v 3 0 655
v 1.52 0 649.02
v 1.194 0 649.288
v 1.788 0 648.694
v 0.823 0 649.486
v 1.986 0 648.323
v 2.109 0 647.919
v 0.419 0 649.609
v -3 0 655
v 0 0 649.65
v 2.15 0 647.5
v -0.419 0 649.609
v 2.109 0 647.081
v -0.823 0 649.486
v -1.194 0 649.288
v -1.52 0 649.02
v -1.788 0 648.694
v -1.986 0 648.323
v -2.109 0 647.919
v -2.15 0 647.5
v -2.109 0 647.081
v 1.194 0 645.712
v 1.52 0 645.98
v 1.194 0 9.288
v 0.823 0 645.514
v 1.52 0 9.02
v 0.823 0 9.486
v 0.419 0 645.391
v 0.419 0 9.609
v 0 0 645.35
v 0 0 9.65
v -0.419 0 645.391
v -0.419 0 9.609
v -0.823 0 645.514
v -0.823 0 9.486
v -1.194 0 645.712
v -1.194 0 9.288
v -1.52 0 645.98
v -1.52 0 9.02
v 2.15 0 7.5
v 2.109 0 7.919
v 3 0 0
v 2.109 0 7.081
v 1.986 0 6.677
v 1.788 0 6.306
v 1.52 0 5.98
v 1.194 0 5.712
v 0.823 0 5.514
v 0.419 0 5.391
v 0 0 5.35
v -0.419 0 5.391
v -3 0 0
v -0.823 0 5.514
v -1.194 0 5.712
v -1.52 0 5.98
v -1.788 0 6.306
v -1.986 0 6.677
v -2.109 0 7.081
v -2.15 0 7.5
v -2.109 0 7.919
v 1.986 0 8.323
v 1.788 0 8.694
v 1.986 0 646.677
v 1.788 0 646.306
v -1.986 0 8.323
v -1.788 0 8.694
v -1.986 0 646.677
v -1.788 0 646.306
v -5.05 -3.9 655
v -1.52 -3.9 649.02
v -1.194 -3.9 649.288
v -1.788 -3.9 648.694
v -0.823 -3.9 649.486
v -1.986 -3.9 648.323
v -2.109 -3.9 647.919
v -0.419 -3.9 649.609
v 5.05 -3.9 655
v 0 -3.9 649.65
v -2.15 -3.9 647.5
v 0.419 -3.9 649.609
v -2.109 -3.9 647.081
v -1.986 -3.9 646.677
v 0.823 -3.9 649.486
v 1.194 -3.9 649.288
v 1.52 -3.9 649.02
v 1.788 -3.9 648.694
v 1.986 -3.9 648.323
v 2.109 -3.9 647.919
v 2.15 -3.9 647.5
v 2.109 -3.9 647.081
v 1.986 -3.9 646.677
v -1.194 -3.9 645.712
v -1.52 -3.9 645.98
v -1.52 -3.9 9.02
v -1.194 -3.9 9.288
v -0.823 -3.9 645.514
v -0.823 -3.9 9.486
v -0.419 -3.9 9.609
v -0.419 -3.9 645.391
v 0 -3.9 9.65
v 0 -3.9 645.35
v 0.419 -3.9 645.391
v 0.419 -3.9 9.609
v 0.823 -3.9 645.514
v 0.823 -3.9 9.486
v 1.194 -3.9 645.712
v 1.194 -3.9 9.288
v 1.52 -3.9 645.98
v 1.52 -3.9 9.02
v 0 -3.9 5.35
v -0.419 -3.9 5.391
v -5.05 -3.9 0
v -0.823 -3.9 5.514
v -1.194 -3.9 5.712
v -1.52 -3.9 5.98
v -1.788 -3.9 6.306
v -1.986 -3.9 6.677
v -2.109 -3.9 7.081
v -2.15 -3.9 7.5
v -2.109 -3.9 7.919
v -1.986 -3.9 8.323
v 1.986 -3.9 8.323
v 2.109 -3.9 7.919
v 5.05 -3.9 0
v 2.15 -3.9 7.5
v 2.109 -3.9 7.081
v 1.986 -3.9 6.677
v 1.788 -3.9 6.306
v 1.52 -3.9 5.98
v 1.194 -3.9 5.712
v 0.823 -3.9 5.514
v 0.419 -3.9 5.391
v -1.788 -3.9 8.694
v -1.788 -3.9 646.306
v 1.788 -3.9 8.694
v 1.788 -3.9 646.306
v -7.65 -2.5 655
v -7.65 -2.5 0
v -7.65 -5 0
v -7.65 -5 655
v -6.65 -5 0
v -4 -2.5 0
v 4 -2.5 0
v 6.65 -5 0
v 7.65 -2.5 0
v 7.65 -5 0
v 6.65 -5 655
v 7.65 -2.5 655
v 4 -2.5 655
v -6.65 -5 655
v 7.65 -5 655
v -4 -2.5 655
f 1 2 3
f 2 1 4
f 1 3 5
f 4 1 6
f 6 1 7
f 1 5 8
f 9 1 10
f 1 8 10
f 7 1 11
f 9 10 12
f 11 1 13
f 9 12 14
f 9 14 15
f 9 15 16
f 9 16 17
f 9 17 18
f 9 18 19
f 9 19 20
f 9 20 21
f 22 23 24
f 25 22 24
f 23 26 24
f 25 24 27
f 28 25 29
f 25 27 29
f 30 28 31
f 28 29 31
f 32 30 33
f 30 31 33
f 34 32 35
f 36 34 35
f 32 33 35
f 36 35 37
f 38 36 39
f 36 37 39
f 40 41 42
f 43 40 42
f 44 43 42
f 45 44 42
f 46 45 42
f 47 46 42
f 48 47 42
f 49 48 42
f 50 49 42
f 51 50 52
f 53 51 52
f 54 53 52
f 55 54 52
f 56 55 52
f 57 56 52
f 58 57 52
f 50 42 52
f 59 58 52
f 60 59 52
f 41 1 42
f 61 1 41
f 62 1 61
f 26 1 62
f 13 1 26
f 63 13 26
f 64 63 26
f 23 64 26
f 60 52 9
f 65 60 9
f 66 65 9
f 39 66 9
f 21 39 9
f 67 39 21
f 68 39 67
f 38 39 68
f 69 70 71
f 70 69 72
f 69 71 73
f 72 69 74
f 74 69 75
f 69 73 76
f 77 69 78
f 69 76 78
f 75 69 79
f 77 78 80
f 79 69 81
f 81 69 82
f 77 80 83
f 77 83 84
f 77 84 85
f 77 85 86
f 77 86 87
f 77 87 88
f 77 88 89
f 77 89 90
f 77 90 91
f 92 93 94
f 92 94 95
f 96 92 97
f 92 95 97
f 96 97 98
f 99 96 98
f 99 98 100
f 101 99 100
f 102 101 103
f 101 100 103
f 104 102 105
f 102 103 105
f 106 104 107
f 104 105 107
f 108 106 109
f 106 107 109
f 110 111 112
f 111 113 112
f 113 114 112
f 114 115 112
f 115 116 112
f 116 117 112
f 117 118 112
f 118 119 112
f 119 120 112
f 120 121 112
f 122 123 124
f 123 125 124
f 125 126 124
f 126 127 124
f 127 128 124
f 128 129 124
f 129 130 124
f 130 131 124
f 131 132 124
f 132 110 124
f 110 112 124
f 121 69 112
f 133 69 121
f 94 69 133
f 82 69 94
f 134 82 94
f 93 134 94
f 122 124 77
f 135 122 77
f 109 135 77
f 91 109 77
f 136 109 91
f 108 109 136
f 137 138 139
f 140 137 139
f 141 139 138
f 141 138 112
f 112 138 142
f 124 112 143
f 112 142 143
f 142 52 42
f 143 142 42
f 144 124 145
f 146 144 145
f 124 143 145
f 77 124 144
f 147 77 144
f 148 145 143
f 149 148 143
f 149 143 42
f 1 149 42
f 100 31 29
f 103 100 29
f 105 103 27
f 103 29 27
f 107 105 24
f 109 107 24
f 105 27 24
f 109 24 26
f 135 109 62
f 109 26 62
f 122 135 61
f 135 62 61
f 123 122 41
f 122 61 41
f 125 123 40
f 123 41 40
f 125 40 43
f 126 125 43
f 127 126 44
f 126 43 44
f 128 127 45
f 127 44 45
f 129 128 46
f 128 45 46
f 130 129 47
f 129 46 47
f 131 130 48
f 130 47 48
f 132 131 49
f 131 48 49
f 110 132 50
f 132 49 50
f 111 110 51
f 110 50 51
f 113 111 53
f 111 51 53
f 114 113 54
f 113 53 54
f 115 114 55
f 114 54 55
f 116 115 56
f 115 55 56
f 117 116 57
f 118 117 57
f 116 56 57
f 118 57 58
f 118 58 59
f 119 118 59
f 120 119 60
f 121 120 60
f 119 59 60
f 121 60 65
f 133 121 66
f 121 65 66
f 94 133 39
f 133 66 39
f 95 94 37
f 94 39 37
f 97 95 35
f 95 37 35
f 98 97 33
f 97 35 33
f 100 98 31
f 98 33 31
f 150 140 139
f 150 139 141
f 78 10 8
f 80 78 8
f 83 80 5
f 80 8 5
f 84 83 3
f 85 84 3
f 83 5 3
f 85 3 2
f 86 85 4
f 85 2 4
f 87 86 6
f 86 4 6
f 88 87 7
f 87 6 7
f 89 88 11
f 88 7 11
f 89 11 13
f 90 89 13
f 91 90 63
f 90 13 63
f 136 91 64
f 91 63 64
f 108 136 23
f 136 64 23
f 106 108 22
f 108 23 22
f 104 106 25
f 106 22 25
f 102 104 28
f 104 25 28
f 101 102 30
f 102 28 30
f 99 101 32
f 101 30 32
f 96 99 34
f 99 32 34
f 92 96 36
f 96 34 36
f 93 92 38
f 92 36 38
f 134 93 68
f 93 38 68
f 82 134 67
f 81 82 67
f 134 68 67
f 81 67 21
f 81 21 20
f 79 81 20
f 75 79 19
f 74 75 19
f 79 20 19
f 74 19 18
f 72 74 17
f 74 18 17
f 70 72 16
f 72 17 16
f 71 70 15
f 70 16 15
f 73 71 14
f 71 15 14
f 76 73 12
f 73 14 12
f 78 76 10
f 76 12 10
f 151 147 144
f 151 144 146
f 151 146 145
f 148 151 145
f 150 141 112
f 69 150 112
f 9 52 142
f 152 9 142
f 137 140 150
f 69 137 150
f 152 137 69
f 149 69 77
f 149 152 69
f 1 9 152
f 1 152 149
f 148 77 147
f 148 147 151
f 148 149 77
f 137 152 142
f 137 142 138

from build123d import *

# Parameters (mm, degrees)
EXTRUDE_1_DEPTH     = 655
SKETCH_2_R          = 2.15
CUT_EXTRUDE_1_DEPTH = 3.9


with BuildPart() as part:
    # ｽｹｯﾁ1 → ﾎﾞｽ - 押し出し1 (new body)
    with BuildSketch(Plane.XY):
        Polygon((4, -2.5), (3, 0), (0, 0), (0, -3.9), (5.05, -3.9), (6.65, -5), (7.65, -5), (7.65, -2.5), align=None)
        Polygon((0, -3.9), (0, 0), (-3, 0), (-4, -2.5), (-7.65, -2.5), (-7.65, -5), (-6.65, -5), (-5.05, -3.9), align=None)
    extrude(amount=EXTRUDE_1_DEPTH)

    # ｽｹｯﾁ2 → ｶｯﾄ - 押し出し1 (cut)
    with BuildSketch(Plane(origin=(0, 0, 0), x_dir=(1, 0, 0), z_dir=(0, 1, 0))):
        with Locations(Location((0, -7.5, 0), (0, 0, 270))):
            Circle(SKETCH_2_R)
        with Locations(Location((0, -647.5, 0), (0, 0, 270))):
            Circle(SKETCH_2_R)
    extrude(amount=-CUT_EXTRUDE_1_DEPTH, mode=Mode.SUBTRACT)


solid = part.part
